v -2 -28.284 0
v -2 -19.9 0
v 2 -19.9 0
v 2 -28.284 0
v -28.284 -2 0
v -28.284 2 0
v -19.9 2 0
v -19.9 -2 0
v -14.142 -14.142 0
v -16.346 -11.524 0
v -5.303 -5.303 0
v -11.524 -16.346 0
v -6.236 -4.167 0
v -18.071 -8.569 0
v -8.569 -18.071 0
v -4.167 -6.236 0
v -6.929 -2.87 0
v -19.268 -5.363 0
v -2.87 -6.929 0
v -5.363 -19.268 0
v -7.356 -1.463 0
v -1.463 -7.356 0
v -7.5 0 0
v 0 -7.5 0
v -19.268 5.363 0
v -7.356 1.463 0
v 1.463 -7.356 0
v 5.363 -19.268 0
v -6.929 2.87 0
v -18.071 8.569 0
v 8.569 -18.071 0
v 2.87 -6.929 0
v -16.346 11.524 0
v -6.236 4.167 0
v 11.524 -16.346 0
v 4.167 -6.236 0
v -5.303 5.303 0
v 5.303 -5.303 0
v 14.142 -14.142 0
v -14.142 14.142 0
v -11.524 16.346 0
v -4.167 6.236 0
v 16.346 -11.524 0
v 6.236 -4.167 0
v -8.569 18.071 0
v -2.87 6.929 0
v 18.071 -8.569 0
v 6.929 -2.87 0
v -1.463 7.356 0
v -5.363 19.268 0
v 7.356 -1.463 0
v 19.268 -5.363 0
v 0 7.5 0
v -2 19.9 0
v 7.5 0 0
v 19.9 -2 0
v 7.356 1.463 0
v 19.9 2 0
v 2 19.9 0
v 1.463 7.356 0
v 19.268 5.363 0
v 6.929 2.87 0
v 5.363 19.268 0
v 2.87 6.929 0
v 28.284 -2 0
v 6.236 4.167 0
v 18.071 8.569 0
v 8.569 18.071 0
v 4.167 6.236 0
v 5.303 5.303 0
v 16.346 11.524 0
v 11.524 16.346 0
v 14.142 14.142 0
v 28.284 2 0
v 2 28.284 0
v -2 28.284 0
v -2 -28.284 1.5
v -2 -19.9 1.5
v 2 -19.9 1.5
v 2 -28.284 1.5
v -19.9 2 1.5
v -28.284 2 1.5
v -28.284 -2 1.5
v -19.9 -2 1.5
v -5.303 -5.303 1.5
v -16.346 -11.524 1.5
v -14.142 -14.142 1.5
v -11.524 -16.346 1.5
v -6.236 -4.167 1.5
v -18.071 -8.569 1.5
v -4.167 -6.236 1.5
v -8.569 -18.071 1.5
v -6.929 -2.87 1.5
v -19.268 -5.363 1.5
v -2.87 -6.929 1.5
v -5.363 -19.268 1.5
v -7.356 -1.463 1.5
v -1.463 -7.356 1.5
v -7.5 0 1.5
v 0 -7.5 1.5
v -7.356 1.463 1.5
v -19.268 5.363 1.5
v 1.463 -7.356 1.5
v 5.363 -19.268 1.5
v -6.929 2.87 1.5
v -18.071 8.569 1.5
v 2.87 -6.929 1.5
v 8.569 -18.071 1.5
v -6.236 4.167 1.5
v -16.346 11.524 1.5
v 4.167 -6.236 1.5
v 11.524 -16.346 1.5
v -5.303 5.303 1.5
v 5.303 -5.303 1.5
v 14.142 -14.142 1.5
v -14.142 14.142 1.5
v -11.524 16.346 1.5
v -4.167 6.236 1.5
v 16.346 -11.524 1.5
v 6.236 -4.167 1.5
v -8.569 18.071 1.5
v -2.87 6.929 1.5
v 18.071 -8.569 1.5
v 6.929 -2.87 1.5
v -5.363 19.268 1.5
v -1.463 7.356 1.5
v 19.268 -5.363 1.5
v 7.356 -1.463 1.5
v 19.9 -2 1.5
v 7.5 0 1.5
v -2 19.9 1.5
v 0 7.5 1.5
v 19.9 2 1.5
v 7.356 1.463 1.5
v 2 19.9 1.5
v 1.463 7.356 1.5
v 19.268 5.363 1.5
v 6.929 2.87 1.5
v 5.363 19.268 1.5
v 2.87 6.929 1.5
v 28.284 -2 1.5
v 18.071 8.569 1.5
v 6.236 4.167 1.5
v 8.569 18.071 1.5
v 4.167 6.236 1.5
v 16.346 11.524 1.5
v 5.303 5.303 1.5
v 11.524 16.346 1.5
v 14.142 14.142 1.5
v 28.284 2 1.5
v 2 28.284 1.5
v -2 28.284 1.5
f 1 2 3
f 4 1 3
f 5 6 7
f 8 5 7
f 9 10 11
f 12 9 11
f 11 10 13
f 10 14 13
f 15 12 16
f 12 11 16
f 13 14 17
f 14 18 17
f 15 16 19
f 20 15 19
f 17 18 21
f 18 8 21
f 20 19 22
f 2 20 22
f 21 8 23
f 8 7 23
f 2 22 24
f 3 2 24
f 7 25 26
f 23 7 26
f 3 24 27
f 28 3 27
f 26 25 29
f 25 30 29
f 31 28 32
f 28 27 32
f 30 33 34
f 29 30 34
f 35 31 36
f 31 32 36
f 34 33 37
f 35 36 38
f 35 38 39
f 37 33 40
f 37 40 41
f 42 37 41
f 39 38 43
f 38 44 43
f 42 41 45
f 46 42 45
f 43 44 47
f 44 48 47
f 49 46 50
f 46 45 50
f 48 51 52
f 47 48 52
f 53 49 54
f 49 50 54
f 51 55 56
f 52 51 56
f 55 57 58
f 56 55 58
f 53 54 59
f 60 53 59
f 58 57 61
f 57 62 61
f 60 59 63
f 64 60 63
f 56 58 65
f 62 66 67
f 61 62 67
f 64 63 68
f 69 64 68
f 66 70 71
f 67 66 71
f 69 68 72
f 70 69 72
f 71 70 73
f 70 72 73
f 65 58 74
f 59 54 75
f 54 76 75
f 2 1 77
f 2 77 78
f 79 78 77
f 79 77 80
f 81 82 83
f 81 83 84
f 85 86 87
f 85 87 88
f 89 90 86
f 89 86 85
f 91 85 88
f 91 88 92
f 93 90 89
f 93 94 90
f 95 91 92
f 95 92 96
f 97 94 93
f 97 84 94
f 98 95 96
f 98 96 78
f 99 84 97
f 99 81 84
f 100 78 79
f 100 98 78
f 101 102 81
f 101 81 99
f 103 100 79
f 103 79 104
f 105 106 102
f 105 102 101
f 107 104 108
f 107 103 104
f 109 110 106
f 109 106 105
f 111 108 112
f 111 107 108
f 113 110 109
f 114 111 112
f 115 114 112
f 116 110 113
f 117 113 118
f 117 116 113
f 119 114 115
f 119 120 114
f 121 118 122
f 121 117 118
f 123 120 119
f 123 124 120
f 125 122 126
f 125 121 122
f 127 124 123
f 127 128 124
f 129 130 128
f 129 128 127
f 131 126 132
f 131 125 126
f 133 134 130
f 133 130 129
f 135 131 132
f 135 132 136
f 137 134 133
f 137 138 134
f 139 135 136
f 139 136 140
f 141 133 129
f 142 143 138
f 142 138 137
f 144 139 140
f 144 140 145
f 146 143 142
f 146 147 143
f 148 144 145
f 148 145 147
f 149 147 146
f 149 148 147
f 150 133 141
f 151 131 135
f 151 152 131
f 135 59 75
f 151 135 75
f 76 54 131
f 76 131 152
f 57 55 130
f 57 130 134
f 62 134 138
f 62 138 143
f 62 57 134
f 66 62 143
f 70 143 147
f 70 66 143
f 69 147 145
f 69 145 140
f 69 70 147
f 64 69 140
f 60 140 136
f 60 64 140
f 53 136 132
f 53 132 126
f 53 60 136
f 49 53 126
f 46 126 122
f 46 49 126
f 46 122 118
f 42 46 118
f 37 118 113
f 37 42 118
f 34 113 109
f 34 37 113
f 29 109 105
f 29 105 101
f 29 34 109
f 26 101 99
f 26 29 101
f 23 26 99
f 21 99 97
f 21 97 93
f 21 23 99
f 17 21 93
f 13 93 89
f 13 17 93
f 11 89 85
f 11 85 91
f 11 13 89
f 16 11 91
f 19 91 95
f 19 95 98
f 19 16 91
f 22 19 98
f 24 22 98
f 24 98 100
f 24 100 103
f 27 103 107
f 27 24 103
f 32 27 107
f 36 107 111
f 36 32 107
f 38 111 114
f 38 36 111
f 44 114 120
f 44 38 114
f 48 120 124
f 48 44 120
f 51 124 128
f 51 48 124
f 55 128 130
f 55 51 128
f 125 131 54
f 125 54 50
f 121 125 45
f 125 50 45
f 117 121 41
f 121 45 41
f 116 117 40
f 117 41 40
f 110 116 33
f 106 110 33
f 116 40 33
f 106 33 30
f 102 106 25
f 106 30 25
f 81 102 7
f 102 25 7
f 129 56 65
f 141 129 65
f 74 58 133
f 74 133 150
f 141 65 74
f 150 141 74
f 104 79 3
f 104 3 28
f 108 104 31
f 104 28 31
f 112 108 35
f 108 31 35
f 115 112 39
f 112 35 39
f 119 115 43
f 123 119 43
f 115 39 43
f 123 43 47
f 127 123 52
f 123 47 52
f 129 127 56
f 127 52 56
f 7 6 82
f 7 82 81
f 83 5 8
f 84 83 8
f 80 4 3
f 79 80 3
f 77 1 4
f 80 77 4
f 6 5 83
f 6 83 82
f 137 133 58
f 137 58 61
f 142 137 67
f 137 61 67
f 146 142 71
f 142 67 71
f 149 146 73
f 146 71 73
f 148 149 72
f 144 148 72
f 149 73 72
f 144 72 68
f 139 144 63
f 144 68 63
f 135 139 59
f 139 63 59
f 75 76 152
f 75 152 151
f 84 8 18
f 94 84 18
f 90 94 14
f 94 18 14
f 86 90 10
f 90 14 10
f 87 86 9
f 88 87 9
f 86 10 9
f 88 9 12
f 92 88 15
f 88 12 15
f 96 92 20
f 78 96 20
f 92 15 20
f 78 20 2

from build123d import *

# Parameters (mm, degrees)
SKETCH_1_R      = 20
SKETCH_1_R_2    = 7.5
EXTRUDE_1_DEPTH = 1.5
SKETCH_2_W      = 9.284271247
SKETCH_2_H      = 4
SKETCH_2_W_2    = 4
SKETCH_2_H_2    = 9.284271247
EXTRUDE_2_DEPTH = 1.5


with BuildPart() as part:
    # 草图1 → 凸台-拉伸1 (new body)
    with BuildSketch(Plane.XY):
        Circle(SKETCH_1_R)
        Circle(SKETCH_1_R_2, mode=Mode.SUBTRACT)
    extrude(amount=EXTRUDE_1_DEPTH)

    # 草图2 → 凸台-拉伸2 (add)
    with BuildSketch(Plane.XY):
        with Locations((23.642135624, 0)):
            Rectangle(SKETCH_2_W, SKETCH_2_H)
        with Locations((0, 23.642135624)):
            Rectangle(SKETCH_2_W_2, SKETCH_2_H_2)
        with Locations((-23.642135624, 0)):
            Rectangle(SKETCH_2_W, SKETCH_2_H)
        with Locations((0, -23.642135624)):
            Rectangle(SKETCH_2_W_2, SKETCH_2_H_2)
    extrude(amount=EXTRUDE_2_DEPTH)


solid = part.part
